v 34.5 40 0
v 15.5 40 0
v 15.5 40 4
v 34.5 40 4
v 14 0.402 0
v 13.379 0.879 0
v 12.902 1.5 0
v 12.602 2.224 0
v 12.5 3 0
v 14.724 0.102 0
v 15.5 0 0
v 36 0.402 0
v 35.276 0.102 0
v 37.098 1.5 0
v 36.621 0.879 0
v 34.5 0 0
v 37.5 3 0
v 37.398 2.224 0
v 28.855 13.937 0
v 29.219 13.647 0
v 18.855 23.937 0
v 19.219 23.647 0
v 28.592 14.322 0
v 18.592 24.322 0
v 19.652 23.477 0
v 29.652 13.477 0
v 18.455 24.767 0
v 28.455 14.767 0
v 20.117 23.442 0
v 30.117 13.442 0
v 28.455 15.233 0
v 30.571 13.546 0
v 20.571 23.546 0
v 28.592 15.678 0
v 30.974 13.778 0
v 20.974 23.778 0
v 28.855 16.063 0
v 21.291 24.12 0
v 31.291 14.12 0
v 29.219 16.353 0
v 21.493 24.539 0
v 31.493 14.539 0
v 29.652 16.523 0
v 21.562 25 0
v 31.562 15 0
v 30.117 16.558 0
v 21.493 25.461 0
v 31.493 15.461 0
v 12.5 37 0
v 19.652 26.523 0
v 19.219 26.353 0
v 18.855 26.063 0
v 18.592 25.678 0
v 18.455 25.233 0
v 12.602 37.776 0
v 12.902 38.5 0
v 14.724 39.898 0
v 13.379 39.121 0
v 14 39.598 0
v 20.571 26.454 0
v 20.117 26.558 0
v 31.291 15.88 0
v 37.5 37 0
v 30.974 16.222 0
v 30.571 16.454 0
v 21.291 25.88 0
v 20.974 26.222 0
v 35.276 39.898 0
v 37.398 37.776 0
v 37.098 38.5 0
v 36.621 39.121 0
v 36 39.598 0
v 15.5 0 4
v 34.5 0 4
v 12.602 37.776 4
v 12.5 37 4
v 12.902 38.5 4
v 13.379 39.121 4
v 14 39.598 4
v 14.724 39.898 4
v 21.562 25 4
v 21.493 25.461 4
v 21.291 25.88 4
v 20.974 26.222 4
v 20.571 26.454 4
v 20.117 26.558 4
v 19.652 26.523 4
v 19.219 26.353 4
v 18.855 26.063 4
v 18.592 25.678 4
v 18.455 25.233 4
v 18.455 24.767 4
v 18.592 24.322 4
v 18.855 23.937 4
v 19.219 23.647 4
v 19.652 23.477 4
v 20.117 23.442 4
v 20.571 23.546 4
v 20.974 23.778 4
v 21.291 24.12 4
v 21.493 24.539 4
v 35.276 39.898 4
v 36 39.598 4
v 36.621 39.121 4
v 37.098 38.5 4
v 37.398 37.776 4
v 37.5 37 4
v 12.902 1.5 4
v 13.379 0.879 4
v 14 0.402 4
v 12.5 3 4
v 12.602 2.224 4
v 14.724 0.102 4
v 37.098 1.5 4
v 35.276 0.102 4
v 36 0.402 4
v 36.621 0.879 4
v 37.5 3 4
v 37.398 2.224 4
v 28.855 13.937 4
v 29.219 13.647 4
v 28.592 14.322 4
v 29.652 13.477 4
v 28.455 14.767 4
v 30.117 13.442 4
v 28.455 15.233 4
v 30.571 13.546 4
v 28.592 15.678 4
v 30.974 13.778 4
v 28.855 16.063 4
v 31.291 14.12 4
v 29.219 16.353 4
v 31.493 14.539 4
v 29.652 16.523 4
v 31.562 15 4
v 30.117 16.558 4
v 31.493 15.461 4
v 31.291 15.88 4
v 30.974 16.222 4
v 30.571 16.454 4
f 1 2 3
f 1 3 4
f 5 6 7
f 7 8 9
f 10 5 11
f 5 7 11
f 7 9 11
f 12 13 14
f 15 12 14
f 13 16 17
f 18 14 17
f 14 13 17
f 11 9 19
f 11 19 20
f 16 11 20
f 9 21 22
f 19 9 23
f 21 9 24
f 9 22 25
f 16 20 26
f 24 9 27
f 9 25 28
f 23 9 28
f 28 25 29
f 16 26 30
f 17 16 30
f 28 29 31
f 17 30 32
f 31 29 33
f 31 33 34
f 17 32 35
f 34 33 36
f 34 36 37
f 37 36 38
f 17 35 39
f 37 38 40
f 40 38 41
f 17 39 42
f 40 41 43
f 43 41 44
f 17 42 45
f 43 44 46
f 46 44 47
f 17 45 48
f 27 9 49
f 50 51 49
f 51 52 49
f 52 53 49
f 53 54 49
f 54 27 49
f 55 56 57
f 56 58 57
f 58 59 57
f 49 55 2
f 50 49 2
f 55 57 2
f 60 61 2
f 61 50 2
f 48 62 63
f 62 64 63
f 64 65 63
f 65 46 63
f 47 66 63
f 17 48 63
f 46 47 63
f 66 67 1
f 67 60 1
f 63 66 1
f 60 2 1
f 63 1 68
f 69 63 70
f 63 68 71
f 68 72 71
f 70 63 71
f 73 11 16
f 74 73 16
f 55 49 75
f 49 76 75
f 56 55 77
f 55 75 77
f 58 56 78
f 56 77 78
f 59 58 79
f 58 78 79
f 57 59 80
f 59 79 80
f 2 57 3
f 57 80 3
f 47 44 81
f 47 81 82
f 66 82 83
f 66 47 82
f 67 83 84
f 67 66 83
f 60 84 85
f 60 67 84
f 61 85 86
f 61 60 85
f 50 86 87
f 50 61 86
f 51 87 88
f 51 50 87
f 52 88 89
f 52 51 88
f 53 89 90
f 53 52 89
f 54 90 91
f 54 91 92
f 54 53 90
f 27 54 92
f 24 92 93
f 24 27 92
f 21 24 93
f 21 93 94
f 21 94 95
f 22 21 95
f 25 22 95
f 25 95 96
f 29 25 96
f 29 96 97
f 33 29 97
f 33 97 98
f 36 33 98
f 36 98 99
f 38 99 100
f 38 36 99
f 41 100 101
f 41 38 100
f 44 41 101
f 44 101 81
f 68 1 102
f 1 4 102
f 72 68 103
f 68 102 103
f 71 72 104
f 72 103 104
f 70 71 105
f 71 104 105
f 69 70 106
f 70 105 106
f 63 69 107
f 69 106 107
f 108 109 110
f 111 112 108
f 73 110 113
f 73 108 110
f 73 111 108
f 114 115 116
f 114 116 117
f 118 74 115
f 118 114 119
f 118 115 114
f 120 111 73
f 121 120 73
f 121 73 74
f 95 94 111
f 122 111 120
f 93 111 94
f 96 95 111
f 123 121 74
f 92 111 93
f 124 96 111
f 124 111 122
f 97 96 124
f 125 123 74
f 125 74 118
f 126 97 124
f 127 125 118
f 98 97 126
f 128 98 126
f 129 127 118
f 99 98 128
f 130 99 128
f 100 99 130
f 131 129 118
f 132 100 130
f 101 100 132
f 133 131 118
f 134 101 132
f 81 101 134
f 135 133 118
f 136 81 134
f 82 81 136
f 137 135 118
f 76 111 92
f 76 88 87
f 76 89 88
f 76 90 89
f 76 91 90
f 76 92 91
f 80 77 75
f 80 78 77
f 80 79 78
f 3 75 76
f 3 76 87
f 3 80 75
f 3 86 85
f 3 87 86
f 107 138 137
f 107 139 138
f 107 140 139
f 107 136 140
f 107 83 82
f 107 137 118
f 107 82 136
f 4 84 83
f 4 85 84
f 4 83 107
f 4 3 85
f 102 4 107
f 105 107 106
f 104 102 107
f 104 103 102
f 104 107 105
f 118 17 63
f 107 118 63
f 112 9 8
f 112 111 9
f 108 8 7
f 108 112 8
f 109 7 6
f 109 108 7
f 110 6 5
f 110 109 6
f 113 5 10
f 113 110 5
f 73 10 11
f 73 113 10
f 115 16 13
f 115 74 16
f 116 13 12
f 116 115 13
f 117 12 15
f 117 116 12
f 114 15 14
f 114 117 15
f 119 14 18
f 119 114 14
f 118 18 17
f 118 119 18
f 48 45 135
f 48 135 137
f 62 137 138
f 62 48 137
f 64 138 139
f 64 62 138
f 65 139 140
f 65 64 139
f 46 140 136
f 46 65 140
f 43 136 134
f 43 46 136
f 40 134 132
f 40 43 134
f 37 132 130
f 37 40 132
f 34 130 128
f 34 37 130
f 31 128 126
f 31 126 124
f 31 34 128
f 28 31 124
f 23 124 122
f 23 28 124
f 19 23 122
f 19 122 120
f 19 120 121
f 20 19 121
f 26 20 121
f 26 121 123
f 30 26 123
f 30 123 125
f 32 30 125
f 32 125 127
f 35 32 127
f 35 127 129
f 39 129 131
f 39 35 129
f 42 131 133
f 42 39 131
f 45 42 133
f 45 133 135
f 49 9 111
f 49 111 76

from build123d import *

# Parameters (mm, degrees)
SKETCH_W  = 25
SKETCH_H  = 40
SKETCH_R  = 1.5625
PAD_DEPTH = 4
FILLET_R  = 3


with BuildPart() as part:
    # Sketch → Pad (new body)
    with BuildSketch(Plane.XY):
        with Locations((25, 20)):
            Rectangle(SKETCH_W, SKETCH_H)
        with Locations((20, 25)):
            Circle(SKETCH_R, mode=Mode.SUBTRACT)
        with Locations((30, 15)):
            Circle(SKETCH_R, mode=Mode.SUBTRACT)
    extrude(amount=PAD_DEPTH)

    # Fillet
    fillet_edges = [part.edges().sort_by_distance(p)[0] for p in [
        (12.5, 0, 2),
        (12.5, 40, 2),
        (37.5, 40, 2),
        (37.5, 0, 2),
    ]]
    fillet(fillet_edges, radius=FILLET_R)


solid = part.part
